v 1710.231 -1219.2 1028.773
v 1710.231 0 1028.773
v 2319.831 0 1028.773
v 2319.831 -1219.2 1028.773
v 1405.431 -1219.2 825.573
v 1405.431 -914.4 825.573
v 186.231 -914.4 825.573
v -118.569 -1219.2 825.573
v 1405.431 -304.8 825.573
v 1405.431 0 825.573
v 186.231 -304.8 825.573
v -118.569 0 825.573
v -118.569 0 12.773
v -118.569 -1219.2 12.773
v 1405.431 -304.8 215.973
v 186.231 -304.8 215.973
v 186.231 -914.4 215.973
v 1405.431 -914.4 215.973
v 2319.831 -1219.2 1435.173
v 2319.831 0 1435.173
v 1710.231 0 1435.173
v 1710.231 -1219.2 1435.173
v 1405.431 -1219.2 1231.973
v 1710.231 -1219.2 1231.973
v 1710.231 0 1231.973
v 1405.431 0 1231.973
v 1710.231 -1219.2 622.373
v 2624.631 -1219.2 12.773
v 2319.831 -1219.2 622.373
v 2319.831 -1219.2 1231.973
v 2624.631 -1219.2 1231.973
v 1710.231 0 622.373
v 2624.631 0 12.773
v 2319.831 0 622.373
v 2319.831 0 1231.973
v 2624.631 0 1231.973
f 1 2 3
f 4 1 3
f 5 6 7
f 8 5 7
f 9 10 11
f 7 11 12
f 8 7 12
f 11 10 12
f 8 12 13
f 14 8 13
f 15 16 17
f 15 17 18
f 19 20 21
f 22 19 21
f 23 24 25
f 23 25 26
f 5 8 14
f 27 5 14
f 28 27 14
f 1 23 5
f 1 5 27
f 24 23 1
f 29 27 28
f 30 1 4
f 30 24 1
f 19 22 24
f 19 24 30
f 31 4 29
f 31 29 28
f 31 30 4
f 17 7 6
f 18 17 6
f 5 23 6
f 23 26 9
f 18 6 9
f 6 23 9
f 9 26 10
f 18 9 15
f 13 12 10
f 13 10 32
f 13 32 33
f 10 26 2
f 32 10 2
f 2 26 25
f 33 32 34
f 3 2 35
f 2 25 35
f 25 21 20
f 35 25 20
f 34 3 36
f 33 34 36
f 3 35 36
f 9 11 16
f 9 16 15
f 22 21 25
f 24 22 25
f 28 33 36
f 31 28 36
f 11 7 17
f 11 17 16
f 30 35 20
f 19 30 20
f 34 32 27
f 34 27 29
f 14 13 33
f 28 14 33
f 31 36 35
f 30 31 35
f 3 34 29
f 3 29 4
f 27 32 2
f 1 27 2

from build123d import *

# Parameters (mm, degrees)
F1_DEPTH = 1219.2
F2_W     = 609.6
F2_H     = 406.4
F3_DEPTH = 1219.201
F4_W     = 1219.2
F4_H     = 609.6
F5_DEPTH = 609.6


with BuildPart() as f1:
    # F0 (on Front) → F1 (new body)
    with BuildSketch(Plane.XZ):
        Polygon((-118.569039, 825.572681), (-118.569039, 12.772681), (2624.630961, 12.772681), (2624.630961, 1231.972681), (2319.830961, 1231.972681), (2319.830961, 1435.172681), (1710.230961, 1435.172681), (1710.230961, 1231.972681), (1405.430961, 1231.972681), (1405.430961, 825.572681), align=None)
    extrude(amount=F1_DEPTH)

    # F2 (on face) → F3 (cut, through all)
    with BuildSketch(Plane.XZ.offset(1219.2)):
        with Locations((2015.030961, 825.572681)):
            Rectangle(F2_W, F2_H)
    extrude(amount=-F3_DEPTH, mode=Mode.SUBTRACT)

    # F4 (on face) → F5 (cut)
    with BuildSketch(Plane.XY.offset(825.572681)):
        with Locations((795.830961, -609.6)):
            Rectangle(F4_W, F4_H)
    extrude(amount=-F5_DEPTH, mode=Mode.SUBTRACT)


solid = f1.part
